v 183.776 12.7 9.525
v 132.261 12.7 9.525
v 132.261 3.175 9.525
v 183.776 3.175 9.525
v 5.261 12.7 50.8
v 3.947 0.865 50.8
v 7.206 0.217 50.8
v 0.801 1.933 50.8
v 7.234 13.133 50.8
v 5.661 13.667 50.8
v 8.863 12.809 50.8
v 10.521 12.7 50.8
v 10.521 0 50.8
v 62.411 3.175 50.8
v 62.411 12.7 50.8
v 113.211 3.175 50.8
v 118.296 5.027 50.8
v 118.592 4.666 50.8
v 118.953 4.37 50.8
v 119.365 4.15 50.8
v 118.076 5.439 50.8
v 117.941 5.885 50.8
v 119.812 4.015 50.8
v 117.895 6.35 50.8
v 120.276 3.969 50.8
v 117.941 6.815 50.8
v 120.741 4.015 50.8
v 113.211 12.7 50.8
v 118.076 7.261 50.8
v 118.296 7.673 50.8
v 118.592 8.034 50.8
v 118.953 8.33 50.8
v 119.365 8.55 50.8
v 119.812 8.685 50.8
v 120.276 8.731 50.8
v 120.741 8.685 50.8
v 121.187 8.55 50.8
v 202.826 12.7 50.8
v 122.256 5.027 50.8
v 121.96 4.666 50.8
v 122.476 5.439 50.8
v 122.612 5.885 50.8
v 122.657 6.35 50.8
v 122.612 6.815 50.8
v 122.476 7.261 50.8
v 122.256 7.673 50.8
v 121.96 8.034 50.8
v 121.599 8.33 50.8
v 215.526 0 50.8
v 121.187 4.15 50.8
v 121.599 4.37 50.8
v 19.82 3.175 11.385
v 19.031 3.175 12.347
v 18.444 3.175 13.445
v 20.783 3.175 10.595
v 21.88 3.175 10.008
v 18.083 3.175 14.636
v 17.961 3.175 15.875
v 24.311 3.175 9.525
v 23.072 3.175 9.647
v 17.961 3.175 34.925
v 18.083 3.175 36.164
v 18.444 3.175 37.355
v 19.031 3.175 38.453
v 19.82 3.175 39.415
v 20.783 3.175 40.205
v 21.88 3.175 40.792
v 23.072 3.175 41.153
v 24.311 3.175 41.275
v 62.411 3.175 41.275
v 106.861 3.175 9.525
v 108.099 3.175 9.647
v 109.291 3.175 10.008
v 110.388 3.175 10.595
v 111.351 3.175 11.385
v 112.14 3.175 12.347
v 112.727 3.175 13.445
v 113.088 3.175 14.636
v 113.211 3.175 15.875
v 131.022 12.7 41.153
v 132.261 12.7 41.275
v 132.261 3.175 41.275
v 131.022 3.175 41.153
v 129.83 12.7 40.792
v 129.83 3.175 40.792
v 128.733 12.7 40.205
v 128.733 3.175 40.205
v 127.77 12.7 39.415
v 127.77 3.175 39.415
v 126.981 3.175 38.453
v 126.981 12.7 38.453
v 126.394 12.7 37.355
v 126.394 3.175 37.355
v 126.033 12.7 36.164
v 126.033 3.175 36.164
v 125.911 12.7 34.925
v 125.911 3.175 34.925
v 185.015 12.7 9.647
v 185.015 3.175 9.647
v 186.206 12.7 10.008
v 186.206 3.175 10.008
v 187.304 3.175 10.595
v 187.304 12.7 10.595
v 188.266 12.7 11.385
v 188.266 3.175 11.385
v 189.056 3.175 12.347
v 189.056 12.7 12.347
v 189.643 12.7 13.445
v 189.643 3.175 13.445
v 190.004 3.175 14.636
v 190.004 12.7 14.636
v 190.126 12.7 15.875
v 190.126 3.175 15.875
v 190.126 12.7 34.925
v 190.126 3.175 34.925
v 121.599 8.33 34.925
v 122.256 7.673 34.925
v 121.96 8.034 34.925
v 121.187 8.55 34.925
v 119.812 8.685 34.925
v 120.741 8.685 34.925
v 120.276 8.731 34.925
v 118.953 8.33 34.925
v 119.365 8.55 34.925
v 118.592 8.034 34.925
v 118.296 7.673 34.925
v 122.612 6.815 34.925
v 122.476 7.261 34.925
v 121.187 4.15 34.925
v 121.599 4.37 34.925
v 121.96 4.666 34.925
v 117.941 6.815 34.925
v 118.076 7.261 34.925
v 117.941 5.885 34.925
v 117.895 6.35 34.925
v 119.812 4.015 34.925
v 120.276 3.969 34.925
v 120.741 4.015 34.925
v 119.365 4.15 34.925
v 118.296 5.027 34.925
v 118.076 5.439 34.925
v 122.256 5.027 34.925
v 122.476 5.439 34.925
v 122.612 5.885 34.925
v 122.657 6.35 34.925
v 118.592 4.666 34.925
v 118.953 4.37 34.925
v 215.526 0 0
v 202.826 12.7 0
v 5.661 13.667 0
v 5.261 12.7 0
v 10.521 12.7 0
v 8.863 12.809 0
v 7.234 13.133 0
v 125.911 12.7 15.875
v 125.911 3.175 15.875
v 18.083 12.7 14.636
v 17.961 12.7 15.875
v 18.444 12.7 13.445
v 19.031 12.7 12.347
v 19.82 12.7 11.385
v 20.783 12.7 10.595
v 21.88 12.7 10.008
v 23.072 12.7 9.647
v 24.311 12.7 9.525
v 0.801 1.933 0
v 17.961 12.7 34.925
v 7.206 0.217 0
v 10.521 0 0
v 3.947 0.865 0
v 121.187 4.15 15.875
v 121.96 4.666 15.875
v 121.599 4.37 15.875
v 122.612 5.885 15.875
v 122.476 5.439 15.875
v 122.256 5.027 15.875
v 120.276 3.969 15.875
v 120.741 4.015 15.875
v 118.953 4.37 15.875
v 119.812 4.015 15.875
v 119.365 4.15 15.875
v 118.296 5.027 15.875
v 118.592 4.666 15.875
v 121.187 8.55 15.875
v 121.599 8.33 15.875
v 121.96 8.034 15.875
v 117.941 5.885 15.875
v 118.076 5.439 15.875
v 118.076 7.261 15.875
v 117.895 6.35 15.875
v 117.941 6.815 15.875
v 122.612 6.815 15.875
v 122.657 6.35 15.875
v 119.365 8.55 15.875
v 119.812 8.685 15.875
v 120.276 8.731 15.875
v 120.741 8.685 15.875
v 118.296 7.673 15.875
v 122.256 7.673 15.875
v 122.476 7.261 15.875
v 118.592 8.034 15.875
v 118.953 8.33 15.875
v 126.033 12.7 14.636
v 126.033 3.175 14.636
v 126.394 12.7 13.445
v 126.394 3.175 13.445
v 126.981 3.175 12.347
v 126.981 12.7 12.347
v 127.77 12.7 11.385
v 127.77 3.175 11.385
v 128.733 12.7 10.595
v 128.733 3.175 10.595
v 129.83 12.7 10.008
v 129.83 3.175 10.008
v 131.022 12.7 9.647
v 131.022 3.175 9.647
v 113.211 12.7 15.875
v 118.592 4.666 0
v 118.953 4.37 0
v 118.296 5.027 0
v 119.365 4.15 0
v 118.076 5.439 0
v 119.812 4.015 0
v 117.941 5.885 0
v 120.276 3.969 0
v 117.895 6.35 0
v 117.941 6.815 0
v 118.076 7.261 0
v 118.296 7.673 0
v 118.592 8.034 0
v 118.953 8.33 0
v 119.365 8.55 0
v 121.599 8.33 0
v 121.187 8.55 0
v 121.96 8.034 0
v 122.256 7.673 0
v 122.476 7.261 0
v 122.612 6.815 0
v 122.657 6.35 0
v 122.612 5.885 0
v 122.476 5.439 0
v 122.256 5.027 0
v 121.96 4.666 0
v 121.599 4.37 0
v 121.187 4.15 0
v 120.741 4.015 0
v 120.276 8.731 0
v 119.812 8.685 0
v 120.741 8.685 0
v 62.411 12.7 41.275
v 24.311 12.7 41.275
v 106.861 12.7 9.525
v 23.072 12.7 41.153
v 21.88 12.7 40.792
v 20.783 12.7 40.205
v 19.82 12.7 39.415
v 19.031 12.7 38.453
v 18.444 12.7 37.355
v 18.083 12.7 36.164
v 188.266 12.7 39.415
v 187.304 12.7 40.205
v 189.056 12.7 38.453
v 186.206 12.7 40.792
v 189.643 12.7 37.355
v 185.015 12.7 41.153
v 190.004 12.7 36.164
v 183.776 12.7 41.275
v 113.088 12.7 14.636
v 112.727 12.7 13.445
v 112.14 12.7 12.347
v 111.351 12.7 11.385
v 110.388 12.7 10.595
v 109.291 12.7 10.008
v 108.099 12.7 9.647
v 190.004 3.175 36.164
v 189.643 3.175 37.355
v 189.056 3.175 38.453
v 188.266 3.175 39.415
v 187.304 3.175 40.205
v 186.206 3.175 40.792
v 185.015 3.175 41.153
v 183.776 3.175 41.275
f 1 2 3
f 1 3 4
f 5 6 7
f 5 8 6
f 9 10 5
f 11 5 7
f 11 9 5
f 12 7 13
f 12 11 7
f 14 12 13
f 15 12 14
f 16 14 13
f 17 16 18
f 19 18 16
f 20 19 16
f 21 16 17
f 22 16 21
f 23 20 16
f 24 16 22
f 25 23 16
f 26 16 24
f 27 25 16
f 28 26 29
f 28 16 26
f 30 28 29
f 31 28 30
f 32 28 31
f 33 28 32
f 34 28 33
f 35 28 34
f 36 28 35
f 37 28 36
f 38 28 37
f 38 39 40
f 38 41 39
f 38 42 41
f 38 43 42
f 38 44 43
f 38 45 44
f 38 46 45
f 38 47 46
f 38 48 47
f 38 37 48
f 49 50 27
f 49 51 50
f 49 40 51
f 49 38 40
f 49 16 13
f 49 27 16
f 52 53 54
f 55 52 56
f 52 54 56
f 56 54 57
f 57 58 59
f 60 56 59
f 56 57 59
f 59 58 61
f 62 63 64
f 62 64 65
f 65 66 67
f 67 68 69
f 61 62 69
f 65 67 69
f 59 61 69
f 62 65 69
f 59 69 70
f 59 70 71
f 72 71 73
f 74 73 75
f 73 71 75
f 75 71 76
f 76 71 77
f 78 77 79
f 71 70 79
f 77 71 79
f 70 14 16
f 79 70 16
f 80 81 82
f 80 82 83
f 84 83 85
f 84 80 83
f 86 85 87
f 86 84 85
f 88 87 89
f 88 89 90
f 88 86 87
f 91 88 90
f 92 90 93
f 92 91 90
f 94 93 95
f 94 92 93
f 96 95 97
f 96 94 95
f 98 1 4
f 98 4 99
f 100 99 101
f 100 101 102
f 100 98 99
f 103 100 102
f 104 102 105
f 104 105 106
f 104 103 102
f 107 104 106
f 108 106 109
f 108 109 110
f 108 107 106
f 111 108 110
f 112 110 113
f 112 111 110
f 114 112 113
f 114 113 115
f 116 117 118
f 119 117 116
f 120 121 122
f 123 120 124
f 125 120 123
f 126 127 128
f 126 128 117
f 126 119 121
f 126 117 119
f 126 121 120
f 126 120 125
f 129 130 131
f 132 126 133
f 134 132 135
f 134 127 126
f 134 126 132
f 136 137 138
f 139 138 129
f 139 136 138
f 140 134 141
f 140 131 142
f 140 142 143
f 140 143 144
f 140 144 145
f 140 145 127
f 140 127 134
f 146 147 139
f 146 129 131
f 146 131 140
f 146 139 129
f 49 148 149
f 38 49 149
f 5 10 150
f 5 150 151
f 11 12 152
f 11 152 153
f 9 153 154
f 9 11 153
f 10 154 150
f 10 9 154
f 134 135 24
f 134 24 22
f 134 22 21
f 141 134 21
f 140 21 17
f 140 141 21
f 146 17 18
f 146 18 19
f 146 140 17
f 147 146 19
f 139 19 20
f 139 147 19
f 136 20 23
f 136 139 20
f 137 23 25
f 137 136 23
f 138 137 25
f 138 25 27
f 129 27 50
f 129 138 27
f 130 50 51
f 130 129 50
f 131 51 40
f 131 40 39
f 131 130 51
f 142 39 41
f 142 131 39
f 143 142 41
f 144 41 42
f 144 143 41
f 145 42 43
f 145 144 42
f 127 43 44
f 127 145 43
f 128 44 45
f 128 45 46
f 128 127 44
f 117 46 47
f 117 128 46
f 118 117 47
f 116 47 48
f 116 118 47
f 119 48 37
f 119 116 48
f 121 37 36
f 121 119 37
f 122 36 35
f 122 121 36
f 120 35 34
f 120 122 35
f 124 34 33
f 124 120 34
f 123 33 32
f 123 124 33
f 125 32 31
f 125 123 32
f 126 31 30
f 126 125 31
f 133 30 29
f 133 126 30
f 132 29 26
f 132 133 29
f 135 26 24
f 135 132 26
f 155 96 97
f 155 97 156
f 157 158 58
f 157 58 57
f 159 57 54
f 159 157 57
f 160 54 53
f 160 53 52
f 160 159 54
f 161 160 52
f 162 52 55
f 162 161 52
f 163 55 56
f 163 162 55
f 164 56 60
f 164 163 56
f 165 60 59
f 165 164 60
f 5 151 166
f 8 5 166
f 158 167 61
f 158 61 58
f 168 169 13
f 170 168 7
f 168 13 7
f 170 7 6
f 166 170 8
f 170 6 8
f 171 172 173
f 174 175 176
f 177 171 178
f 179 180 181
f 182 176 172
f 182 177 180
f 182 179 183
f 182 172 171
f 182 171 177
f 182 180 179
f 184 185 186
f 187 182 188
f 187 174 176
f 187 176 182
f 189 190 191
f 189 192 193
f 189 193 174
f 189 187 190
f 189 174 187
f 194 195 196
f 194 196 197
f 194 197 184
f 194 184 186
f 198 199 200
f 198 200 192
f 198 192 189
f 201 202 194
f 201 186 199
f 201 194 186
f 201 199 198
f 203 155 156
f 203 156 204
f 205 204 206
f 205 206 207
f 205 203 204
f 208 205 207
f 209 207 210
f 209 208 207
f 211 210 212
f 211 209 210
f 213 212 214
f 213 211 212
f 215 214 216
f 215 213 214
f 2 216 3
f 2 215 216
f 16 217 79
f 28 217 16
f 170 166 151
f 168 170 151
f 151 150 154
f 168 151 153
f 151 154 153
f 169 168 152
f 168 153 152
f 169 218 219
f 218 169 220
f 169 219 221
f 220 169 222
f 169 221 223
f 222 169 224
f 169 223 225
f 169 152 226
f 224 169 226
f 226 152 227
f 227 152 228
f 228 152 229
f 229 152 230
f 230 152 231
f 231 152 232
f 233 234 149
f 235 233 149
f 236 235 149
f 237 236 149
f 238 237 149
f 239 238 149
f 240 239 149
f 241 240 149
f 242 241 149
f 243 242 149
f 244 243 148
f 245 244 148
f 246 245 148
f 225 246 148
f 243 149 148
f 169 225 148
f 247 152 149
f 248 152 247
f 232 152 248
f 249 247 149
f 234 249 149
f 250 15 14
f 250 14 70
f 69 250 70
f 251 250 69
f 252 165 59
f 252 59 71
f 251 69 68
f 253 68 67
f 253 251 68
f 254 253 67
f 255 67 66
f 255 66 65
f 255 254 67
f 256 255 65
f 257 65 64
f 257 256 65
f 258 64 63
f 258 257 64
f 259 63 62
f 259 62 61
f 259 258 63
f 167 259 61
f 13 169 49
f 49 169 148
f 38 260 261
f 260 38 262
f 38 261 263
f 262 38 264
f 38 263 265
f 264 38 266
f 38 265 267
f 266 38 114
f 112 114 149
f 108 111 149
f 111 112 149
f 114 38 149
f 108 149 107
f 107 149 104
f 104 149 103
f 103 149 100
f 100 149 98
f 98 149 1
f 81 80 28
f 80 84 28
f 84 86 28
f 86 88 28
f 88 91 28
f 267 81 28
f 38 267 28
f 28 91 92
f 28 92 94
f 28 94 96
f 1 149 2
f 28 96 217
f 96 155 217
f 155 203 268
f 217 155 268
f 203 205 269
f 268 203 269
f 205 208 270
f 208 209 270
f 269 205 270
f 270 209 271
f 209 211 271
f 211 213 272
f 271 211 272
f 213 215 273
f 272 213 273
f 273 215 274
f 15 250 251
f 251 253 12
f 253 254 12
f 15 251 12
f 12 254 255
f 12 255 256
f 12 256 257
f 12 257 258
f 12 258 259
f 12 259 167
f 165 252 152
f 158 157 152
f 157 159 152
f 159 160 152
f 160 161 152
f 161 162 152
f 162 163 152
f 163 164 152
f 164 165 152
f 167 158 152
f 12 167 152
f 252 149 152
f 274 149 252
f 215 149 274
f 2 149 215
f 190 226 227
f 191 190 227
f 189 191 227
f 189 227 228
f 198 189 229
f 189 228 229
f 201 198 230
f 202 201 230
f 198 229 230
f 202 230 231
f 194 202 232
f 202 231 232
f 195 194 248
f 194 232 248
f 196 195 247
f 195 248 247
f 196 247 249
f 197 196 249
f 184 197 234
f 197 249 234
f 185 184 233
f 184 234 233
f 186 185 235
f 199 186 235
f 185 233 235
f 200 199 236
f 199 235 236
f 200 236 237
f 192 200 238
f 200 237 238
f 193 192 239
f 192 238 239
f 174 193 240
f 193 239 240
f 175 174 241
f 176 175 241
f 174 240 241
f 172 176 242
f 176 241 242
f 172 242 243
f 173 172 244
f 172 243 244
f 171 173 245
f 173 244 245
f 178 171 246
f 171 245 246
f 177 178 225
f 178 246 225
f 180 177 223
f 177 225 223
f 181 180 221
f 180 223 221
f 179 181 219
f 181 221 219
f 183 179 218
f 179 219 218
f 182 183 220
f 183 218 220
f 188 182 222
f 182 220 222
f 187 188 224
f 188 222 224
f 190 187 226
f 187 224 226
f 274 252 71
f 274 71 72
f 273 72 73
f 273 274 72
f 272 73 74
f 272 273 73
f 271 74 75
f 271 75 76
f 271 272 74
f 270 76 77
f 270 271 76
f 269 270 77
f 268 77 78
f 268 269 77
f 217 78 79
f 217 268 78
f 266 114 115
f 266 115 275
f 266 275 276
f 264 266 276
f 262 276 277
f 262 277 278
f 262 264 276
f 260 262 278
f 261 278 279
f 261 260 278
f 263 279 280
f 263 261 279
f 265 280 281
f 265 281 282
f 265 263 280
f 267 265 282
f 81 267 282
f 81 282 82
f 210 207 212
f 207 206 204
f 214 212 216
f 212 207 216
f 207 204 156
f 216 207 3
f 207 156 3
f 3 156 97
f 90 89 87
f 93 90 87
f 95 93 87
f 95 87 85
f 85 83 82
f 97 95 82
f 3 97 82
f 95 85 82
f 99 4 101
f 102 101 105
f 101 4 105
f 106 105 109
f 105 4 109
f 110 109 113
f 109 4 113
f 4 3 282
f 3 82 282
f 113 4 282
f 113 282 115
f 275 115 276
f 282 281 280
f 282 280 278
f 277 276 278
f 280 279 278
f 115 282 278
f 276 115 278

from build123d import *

# Parameters (mm, degrees)
EXTRUDE1_DEPTH     = 50.8
CUT_EXTRUDE1_DEPTH = 9.525
SKETCH3_R          = 2.38125
CUT_EXTRUDE2_DEPTH = 15.875
CUT_EXTRUDE3_START = -15.875
SKETCH4_R          = 2.38125
CUT_EXTRUDE3_DEPTH = 15.875
CUT_EXTRUDE4_DEPTH = 222.795964766
EXTRUDE2_DEPTH     = 50.8


with BuildPart() as part:
    # Sketch1 → Extrude1 (new body)
    with BuildSketch(Plane.XY):
        Polygon((0, 0), (215.526146874, 0), (202.826146874, 12.7), (5.260512242, 12.7), align=None)
    extrude(amount=EXTRUDE1_DEPTH)

    # Sketch2 → Cut-Extrude1 (cut)
    with BuildSketch(Plane(origin=(0, 12.7, 0), x_dir=(-1, 0, 0), z_dir=(0, 1, 0))):
        with BuildLine():
            Line((-113.210512242, 50.8), (-62.410512242, 50.8))
            Line((-62.410512242, 50.8), (-62.410512242, 41.275))
            Line((-62.410512242, 41.275), (-24.310512242, 41.275))
            ThreePointArc((-24.310512242, 41.275), (-19.820384182, 39.415128061), (-17.960512242, 34.925))
            Line((-17.960512242, 34.925), (-17.960512242, 15.875))
            ThreePointArc((-17.960512242, 15.875), (-19.820384182, 11.384871939), (-24.310512242, 9.525))
            Line((-24.310512242, 9.525), (-106.860512242, 9.525))
            ThreePointArc((-106.860512242, 9.525), (-111.350640303, 11.384871939), (-113.210512242, 15.875))
            Line((-113.210512242, 15.875), (-113.210512242, 50.8))
        make_face()
        with BuildLine():
            Line((-132.260512242, 9.525), (-183.776146874, 9.525))
            ThreePointArc((-183.776146874, 9.525), (-188.266274935, 11.384871939), (-190.126146874, 15.875))
            Line((-190.126146874, 15.875), (-190.126146874, 34.925))
            ThreePointArc((-190.126146874, 34.925), (-188.266274935, 39.415128061), (-183.776146874, 41.275))
            Line((-183.776146874, 41.275), (-132.260512242, 41.275))
            ThreePointArc((-132.260512242, 41.275), (-127.770384182, 39.415128061), (-125.910512242, 34.925))
            Line((-125.910512242, 34.925), (-125.910512242, 15.875))
            ThreePointArc((-125.910512242, 15.875), (-127.770384182, 11.384871939), (-132.260512242, 9.525))
        make_face()
    extrude(amount=-CUT_EXTRUDE1_DEPTH, mode=Mode.SUBTRACT)

    # Sketch3 → Cut-Extrude2 (cut)
    with BuildSketch(Plane(origin=(0, 0, 0), x_dir=(-1, 0, 0), z_dir=(0, 0, -1))):
        with Locations((-120.276146874, 6.35)):
            Circle(SKETCH3_R)
    extrude(amount=-CUT_EXTRUDE2_DEPTH, mode=Mode.SUBTRACT)

    # Sketch4 → Cut-Extrude3 (cut)
    with BuildSketch(Plane.XY.offset(50.8).offset(CUT_EXTRUDE3_START)):
        with Locations(Location((120.276146874, 6.35, 0), (0, 0, 180))):
            Circle(SKETCH4_R)
    extrude(amount=CUT_EXTRUDE3_DEPTH, mode=Mode.SUBTRACT)

    # Sketch5 → Cut-Extrude4 (cut, through all)
    with BuildSketch(Plane.XY.offset(50.8)):
        with BuildLine():
            Line((0.800865302, 1.933459874), (0, 0))
            Line((0, 0), (10.521024484, 0))
            ThreePointArc((10.521024484, 0), (5.565730305, 0.488053878), (0.800865302, 1.933459874))
        make_face()
    extrude(amount=-CUT_EXTRUDE4_DEPTH, mode=Mode.SUBTRACT)

    # Sketch6 → Extrude2 (add)
    with BuildSketch(Plane.XY.offset(50.8)):
        with BuildLine():
            Line((5.660944893, 13.666729937), (5.260512242, 12.7))
            Line((5.260512242, 12.7), (10.521024484, 12.7))
            ThreePointArc((10.521024484, 12.7), (8.043377395, 12.944026939), (5.660944893, 13.666729937))
        make_face()
    extrude(amount=-EXTRUDE2_DEPTH)


solid = part.part
